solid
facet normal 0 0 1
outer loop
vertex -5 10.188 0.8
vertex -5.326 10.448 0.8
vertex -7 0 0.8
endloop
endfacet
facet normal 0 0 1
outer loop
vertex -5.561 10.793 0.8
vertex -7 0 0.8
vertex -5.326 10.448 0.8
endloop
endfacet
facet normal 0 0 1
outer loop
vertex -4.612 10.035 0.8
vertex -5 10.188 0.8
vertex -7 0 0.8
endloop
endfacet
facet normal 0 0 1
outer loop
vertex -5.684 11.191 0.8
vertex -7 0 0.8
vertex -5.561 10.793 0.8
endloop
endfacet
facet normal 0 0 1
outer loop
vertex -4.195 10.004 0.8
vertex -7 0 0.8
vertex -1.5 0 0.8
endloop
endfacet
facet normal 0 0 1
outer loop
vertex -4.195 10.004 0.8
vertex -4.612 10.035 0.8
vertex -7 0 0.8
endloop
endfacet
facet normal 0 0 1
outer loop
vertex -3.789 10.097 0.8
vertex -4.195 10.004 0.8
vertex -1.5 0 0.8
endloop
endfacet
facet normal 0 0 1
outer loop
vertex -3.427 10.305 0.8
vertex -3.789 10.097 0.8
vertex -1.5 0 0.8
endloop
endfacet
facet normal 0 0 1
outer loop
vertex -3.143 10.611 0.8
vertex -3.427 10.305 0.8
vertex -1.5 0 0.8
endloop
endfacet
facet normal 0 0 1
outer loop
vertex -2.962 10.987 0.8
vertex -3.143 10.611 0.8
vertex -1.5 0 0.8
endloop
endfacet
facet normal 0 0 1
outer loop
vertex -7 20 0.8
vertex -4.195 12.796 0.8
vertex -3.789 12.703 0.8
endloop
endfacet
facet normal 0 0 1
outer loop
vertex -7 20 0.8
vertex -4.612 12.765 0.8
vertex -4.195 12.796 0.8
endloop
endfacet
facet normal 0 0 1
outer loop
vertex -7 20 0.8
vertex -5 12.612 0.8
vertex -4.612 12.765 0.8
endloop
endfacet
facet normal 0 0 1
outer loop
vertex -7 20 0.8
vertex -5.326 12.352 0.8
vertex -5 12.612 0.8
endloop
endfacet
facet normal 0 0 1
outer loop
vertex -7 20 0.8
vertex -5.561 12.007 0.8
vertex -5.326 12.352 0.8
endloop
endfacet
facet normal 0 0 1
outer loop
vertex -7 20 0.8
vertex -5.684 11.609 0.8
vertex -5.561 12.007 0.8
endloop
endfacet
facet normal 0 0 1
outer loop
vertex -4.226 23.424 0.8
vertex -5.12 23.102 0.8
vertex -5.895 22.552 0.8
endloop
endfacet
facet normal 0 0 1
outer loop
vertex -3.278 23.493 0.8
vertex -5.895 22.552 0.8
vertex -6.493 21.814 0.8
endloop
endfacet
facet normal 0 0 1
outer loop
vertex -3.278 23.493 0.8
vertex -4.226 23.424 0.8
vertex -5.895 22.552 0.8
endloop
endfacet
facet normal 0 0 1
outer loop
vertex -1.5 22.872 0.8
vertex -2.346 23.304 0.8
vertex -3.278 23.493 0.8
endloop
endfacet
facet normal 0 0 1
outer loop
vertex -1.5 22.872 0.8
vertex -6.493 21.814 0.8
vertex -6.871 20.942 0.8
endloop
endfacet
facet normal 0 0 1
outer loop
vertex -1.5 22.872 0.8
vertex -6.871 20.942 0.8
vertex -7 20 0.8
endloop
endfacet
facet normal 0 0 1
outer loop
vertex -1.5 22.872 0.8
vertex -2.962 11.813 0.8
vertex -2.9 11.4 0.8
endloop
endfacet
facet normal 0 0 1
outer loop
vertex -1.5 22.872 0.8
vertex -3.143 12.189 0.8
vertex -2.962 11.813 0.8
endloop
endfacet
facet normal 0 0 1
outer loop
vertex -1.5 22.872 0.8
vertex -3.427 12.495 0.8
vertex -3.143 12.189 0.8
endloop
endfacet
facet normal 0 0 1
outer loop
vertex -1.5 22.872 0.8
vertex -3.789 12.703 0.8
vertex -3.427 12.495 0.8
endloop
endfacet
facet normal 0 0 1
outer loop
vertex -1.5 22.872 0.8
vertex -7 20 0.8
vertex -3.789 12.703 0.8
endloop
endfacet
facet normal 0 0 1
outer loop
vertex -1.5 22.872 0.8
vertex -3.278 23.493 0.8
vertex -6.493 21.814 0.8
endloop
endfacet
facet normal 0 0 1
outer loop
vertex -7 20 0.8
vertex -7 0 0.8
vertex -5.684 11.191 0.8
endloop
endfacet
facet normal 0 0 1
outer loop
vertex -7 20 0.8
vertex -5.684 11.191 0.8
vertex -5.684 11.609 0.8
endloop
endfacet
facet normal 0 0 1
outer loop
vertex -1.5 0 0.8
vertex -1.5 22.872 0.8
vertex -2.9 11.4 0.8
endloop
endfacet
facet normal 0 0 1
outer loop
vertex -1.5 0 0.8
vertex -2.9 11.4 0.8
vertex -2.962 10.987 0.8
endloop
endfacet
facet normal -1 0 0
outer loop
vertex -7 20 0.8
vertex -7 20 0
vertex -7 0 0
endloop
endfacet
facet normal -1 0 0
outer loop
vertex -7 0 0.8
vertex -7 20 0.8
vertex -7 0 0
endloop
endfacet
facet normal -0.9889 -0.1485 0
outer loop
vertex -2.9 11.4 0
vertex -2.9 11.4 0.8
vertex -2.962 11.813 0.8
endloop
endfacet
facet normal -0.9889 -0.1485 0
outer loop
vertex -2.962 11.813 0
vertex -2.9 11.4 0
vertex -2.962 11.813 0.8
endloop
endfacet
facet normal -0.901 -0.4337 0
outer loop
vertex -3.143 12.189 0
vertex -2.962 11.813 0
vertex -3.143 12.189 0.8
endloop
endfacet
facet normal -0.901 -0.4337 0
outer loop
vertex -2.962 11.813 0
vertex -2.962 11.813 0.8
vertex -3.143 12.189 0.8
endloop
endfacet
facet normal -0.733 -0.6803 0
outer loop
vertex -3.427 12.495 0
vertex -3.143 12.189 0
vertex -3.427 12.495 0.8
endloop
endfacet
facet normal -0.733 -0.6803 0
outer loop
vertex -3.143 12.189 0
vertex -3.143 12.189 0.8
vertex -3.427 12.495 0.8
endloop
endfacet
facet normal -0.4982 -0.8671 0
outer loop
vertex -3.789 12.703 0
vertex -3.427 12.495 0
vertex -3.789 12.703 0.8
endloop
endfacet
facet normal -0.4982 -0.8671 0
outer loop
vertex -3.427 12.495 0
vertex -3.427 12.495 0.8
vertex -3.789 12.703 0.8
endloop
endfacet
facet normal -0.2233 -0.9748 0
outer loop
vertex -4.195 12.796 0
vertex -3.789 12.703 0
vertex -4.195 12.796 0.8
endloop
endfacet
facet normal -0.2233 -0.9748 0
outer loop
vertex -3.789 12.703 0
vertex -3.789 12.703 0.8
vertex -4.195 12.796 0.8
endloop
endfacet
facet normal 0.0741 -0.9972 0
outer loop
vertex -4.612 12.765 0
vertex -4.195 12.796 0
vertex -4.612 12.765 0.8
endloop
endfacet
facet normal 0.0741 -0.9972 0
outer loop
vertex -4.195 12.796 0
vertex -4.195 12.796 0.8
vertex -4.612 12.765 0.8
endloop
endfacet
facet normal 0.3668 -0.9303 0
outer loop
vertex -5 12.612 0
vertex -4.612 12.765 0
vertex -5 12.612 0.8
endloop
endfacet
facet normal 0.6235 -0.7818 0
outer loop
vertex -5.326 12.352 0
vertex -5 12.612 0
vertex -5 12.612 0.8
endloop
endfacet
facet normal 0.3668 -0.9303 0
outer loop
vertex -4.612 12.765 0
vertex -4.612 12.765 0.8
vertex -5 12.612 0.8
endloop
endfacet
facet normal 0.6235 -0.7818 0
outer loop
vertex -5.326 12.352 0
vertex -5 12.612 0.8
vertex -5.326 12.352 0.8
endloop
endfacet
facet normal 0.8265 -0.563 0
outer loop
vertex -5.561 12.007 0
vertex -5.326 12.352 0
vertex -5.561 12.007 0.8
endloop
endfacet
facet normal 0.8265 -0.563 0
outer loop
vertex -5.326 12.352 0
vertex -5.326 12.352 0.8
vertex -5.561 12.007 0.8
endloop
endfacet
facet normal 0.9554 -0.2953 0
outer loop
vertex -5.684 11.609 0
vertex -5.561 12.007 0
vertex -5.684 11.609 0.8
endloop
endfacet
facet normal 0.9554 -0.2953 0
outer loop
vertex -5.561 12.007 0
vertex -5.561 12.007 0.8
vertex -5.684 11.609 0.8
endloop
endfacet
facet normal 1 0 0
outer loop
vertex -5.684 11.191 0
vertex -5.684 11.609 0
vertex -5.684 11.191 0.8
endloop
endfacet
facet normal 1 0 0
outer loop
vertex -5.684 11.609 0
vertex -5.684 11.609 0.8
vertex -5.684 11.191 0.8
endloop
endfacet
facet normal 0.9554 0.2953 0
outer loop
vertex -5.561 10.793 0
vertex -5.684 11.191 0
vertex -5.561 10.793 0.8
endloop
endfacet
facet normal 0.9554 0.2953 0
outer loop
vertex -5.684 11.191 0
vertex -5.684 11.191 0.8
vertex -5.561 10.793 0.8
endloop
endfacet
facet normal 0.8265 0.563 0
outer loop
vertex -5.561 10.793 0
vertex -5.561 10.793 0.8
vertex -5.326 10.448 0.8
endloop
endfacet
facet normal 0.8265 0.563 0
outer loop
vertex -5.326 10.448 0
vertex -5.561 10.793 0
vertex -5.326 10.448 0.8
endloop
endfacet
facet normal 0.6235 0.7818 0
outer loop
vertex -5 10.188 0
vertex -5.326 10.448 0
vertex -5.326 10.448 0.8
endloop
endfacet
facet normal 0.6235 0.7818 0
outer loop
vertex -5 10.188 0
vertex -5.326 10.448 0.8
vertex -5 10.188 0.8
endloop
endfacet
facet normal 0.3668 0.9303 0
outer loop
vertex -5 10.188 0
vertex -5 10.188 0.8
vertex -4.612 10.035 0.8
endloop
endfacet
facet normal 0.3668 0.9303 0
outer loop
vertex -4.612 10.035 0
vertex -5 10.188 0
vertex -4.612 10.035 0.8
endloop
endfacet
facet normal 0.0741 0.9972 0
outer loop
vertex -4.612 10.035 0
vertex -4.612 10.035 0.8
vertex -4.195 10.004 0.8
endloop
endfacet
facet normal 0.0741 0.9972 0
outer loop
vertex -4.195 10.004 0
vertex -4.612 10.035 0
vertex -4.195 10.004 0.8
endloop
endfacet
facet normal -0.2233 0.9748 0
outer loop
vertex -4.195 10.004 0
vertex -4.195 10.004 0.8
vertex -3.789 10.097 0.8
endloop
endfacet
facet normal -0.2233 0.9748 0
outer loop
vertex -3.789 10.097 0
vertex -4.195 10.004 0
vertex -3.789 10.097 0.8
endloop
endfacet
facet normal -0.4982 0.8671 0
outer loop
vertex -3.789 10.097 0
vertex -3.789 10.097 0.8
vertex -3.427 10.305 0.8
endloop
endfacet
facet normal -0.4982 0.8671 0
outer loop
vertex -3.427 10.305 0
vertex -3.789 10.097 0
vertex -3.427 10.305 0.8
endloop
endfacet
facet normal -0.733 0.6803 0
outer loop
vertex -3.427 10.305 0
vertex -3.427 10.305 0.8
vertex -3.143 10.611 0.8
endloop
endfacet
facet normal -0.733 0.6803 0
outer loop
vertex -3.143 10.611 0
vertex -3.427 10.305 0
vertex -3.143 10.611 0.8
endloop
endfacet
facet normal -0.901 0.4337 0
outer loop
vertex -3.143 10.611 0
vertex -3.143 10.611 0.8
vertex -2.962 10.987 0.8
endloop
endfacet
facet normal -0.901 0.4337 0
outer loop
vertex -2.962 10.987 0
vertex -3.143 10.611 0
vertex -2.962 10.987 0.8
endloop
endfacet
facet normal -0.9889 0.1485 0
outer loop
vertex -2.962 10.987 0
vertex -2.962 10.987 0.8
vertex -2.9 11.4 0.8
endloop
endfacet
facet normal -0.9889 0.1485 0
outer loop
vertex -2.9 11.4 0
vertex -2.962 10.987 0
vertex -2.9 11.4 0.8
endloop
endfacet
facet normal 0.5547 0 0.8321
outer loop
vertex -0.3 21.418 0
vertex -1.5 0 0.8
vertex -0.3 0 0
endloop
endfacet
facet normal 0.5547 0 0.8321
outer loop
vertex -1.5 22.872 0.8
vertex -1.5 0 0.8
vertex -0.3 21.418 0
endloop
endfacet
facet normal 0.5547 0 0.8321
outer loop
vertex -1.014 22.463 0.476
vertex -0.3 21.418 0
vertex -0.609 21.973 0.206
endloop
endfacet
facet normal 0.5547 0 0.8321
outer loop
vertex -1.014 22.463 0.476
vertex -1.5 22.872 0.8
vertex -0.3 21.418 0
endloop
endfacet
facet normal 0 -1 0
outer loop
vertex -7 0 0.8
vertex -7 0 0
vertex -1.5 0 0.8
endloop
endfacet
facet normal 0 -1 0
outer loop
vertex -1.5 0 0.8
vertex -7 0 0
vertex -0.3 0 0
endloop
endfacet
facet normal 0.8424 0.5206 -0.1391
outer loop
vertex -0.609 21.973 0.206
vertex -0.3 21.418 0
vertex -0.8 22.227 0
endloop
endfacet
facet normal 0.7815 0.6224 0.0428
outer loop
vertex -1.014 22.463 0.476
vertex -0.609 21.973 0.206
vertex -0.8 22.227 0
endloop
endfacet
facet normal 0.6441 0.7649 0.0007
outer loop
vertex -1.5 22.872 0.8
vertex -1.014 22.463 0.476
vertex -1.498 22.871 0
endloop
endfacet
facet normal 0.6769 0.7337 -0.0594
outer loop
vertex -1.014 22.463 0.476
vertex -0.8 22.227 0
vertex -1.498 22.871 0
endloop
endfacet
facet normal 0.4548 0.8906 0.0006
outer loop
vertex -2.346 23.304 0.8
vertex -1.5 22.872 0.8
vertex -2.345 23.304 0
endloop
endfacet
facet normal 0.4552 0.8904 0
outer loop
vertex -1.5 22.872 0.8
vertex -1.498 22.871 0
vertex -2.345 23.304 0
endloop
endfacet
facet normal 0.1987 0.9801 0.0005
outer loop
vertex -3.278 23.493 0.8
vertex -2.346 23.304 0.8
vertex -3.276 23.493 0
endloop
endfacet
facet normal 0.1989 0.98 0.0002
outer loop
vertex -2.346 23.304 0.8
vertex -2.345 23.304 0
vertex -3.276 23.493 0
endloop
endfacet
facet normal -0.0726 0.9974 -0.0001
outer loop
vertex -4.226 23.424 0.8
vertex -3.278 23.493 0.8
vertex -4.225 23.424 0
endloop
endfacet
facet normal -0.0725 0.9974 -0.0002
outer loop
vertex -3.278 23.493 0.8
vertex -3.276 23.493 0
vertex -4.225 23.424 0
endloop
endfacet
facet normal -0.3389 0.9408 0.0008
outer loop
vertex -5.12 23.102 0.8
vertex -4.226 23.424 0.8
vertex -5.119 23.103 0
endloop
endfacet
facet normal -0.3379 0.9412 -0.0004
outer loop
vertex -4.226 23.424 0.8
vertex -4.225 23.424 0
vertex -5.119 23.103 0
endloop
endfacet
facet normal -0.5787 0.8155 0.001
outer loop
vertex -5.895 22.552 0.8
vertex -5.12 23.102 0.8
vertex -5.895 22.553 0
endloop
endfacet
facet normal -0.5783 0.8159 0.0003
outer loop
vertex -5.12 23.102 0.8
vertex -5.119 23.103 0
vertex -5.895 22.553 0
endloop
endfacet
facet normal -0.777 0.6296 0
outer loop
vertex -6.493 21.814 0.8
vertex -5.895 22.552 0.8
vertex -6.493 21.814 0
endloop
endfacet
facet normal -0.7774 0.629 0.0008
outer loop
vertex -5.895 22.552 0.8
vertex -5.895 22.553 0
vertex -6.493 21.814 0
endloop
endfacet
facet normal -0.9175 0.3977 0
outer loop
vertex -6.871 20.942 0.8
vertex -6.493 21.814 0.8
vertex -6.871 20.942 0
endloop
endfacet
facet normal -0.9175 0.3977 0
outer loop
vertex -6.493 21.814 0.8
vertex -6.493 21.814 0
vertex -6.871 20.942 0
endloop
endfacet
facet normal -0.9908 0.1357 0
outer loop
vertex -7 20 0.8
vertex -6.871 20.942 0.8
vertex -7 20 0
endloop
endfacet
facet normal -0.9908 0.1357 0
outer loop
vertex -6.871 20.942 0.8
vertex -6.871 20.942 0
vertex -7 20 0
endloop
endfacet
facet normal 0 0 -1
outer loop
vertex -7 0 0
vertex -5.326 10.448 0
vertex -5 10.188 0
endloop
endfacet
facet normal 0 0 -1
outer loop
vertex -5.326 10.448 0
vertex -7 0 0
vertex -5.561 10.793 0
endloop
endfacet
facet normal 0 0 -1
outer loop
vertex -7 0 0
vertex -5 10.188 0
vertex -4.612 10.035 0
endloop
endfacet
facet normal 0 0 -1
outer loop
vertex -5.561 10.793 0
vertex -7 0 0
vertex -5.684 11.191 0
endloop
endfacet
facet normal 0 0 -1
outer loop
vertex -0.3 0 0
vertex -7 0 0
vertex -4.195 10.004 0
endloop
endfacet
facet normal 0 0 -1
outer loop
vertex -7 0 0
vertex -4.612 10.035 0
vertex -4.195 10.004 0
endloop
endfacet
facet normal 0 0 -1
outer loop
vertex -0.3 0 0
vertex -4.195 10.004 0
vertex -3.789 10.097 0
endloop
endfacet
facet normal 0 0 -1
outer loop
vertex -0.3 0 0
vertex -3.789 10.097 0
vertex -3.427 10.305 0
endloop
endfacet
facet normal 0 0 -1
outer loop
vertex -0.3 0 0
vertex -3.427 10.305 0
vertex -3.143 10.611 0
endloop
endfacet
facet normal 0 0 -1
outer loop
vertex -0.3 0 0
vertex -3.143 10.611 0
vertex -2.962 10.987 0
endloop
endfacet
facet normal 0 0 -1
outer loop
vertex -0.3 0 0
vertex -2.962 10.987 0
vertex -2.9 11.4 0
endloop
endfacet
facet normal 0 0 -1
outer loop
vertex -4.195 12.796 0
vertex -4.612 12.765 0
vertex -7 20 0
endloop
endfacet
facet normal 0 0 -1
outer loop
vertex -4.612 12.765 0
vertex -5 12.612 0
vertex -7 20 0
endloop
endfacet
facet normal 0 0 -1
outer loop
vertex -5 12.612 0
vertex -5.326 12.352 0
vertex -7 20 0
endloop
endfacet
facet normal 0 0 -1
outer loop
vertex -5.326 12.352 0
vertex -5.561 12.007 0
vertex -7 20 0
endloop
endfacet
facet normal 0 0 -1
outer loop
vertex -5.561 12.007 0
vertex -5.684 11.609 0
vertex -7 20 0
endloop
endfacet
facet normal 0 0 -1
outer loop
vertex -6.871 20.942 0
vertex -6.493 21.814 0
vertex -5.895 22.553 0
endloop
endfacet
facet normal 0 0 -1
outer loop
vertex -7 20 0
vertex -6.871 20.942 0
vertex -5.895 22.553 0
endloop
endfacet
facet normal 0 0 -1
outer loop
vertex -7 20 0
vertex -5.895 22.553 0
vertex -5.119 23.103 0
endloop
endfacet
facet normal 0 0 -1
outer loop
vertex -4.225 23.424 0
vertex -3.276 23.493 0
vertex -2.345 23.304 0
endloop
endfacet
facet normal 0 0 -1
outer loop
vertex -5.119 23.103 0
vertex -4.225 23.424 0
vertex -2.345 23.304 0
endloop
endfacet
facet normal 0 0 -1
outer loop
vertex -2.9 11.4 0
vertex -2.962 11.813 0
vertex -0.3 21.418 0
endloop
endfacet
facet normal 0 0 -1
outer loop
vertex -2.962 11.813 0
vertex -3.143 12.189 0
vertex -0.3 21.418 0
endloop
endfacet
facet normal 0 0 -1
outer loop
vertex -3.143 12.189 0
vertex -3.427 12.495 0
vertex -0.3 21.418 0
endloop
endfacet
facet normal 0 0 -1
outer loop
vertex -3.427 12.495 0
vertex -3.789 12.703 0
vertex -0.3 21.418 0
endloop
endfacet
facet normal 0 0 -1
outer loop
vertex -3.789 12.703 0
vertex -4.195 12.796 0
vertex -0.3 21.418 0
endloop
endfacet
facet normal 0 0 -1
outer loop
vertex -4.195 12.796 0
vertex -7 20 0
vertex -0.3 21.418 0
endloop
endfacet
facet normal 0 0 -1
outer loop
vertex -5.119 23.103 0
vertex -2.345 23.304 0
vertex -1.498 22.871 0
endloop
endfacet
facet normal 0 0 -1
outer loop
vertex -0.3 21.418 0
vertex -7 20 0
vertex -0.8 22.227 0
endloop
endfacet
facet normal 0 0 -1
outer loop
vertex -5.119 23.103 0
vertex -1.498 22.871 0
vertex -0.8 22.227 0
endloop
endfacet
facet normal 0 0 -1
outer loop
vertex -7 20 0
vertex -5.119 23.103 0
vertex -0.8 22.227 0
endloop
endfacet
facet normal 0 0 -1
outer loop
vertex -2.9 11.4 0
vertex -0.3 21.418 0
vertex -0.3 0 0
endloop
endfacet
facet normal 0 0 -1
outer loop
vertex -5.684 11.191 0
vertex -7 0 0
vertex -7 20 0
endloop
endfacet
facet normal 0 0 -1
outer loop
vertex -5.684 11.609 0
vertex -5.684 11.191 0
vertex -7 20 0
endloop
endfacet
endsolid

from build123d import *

# Parameters (mm, degrees)
BOSS_EXTRUDE1_DEPTH = 0.8
CHAMFER1_SIZE       = 1.2
CHAMFER1_SIZE_2     = 0.8
CUT_EXTRUDE1_REACH  = 26.533
SKETCH5_R           = 1.4


with BuildPart() as part:
    # Sketch2 → Boss-Extrude1 (new body)
    with BuildSketch(Plane.XY):
        with BuildLine():
            Line((-7, 0), (-0.3, 0))
            Line((-0.3, 0), (-0.3, 20))
            Line((-0.3, 20), (-0.3, 21.417744688))
            ThreePointArc((-0.3, 21.417744688), (-4.224568837, 23.424178734), (-7, 20))
            Line((-7, 20), (-7, 0))
        make_face()
    extrude(amount=BOSS_EXTRUDE1_DEPTH)

    # Chamfer1
    # the kernel refuses this chamfer: 1.2, 0.8 mm, written as the material it takes off along each edge
    with BuildSketch(Plane(origin=(-0.3, 24.518305317, 0.8), x_dir=(-0.9997695277037822, 0, 0.021468383147227363), z_dir=(0, -1, 0))) as chamfer1_piece_1:
        Polygon((CHAMFER1_SIZE * 0.999769527704, CHAMFER1_SIZE * 0.0214683831472), (-CHAMFER1_SIZE_2 * 0.0214683831472, CHAMFER1_SIZE_2 * 0.999769527704), (0, 0), align=None)
    extrude(amount=27.618865945, mode=Mode.SUBTRACT)

    # Sketch5 → Cut-Extrude1 (cut, up to next)
    with BuildSketch(Plane.XY.offset(0.8), mode=Mode.PRIVATE) as cut_extrude1_sk1:
        with Locations((-4.3, 11.4)):
            Circle(SKETCH5_R)
    cut_extrude1_tool1 = extrude(cut_extrude1_sk1.sketch, amount=-CUT_EXTRUDE1_REACH, mode=Mode.PRIVATE) & part.part
    add(cut_extrude1_tool1.solids().sort_by_distance((-4.3, 11.4, 0.8))[0], mode=Mode.SUBTRACT)


solid = part.part
